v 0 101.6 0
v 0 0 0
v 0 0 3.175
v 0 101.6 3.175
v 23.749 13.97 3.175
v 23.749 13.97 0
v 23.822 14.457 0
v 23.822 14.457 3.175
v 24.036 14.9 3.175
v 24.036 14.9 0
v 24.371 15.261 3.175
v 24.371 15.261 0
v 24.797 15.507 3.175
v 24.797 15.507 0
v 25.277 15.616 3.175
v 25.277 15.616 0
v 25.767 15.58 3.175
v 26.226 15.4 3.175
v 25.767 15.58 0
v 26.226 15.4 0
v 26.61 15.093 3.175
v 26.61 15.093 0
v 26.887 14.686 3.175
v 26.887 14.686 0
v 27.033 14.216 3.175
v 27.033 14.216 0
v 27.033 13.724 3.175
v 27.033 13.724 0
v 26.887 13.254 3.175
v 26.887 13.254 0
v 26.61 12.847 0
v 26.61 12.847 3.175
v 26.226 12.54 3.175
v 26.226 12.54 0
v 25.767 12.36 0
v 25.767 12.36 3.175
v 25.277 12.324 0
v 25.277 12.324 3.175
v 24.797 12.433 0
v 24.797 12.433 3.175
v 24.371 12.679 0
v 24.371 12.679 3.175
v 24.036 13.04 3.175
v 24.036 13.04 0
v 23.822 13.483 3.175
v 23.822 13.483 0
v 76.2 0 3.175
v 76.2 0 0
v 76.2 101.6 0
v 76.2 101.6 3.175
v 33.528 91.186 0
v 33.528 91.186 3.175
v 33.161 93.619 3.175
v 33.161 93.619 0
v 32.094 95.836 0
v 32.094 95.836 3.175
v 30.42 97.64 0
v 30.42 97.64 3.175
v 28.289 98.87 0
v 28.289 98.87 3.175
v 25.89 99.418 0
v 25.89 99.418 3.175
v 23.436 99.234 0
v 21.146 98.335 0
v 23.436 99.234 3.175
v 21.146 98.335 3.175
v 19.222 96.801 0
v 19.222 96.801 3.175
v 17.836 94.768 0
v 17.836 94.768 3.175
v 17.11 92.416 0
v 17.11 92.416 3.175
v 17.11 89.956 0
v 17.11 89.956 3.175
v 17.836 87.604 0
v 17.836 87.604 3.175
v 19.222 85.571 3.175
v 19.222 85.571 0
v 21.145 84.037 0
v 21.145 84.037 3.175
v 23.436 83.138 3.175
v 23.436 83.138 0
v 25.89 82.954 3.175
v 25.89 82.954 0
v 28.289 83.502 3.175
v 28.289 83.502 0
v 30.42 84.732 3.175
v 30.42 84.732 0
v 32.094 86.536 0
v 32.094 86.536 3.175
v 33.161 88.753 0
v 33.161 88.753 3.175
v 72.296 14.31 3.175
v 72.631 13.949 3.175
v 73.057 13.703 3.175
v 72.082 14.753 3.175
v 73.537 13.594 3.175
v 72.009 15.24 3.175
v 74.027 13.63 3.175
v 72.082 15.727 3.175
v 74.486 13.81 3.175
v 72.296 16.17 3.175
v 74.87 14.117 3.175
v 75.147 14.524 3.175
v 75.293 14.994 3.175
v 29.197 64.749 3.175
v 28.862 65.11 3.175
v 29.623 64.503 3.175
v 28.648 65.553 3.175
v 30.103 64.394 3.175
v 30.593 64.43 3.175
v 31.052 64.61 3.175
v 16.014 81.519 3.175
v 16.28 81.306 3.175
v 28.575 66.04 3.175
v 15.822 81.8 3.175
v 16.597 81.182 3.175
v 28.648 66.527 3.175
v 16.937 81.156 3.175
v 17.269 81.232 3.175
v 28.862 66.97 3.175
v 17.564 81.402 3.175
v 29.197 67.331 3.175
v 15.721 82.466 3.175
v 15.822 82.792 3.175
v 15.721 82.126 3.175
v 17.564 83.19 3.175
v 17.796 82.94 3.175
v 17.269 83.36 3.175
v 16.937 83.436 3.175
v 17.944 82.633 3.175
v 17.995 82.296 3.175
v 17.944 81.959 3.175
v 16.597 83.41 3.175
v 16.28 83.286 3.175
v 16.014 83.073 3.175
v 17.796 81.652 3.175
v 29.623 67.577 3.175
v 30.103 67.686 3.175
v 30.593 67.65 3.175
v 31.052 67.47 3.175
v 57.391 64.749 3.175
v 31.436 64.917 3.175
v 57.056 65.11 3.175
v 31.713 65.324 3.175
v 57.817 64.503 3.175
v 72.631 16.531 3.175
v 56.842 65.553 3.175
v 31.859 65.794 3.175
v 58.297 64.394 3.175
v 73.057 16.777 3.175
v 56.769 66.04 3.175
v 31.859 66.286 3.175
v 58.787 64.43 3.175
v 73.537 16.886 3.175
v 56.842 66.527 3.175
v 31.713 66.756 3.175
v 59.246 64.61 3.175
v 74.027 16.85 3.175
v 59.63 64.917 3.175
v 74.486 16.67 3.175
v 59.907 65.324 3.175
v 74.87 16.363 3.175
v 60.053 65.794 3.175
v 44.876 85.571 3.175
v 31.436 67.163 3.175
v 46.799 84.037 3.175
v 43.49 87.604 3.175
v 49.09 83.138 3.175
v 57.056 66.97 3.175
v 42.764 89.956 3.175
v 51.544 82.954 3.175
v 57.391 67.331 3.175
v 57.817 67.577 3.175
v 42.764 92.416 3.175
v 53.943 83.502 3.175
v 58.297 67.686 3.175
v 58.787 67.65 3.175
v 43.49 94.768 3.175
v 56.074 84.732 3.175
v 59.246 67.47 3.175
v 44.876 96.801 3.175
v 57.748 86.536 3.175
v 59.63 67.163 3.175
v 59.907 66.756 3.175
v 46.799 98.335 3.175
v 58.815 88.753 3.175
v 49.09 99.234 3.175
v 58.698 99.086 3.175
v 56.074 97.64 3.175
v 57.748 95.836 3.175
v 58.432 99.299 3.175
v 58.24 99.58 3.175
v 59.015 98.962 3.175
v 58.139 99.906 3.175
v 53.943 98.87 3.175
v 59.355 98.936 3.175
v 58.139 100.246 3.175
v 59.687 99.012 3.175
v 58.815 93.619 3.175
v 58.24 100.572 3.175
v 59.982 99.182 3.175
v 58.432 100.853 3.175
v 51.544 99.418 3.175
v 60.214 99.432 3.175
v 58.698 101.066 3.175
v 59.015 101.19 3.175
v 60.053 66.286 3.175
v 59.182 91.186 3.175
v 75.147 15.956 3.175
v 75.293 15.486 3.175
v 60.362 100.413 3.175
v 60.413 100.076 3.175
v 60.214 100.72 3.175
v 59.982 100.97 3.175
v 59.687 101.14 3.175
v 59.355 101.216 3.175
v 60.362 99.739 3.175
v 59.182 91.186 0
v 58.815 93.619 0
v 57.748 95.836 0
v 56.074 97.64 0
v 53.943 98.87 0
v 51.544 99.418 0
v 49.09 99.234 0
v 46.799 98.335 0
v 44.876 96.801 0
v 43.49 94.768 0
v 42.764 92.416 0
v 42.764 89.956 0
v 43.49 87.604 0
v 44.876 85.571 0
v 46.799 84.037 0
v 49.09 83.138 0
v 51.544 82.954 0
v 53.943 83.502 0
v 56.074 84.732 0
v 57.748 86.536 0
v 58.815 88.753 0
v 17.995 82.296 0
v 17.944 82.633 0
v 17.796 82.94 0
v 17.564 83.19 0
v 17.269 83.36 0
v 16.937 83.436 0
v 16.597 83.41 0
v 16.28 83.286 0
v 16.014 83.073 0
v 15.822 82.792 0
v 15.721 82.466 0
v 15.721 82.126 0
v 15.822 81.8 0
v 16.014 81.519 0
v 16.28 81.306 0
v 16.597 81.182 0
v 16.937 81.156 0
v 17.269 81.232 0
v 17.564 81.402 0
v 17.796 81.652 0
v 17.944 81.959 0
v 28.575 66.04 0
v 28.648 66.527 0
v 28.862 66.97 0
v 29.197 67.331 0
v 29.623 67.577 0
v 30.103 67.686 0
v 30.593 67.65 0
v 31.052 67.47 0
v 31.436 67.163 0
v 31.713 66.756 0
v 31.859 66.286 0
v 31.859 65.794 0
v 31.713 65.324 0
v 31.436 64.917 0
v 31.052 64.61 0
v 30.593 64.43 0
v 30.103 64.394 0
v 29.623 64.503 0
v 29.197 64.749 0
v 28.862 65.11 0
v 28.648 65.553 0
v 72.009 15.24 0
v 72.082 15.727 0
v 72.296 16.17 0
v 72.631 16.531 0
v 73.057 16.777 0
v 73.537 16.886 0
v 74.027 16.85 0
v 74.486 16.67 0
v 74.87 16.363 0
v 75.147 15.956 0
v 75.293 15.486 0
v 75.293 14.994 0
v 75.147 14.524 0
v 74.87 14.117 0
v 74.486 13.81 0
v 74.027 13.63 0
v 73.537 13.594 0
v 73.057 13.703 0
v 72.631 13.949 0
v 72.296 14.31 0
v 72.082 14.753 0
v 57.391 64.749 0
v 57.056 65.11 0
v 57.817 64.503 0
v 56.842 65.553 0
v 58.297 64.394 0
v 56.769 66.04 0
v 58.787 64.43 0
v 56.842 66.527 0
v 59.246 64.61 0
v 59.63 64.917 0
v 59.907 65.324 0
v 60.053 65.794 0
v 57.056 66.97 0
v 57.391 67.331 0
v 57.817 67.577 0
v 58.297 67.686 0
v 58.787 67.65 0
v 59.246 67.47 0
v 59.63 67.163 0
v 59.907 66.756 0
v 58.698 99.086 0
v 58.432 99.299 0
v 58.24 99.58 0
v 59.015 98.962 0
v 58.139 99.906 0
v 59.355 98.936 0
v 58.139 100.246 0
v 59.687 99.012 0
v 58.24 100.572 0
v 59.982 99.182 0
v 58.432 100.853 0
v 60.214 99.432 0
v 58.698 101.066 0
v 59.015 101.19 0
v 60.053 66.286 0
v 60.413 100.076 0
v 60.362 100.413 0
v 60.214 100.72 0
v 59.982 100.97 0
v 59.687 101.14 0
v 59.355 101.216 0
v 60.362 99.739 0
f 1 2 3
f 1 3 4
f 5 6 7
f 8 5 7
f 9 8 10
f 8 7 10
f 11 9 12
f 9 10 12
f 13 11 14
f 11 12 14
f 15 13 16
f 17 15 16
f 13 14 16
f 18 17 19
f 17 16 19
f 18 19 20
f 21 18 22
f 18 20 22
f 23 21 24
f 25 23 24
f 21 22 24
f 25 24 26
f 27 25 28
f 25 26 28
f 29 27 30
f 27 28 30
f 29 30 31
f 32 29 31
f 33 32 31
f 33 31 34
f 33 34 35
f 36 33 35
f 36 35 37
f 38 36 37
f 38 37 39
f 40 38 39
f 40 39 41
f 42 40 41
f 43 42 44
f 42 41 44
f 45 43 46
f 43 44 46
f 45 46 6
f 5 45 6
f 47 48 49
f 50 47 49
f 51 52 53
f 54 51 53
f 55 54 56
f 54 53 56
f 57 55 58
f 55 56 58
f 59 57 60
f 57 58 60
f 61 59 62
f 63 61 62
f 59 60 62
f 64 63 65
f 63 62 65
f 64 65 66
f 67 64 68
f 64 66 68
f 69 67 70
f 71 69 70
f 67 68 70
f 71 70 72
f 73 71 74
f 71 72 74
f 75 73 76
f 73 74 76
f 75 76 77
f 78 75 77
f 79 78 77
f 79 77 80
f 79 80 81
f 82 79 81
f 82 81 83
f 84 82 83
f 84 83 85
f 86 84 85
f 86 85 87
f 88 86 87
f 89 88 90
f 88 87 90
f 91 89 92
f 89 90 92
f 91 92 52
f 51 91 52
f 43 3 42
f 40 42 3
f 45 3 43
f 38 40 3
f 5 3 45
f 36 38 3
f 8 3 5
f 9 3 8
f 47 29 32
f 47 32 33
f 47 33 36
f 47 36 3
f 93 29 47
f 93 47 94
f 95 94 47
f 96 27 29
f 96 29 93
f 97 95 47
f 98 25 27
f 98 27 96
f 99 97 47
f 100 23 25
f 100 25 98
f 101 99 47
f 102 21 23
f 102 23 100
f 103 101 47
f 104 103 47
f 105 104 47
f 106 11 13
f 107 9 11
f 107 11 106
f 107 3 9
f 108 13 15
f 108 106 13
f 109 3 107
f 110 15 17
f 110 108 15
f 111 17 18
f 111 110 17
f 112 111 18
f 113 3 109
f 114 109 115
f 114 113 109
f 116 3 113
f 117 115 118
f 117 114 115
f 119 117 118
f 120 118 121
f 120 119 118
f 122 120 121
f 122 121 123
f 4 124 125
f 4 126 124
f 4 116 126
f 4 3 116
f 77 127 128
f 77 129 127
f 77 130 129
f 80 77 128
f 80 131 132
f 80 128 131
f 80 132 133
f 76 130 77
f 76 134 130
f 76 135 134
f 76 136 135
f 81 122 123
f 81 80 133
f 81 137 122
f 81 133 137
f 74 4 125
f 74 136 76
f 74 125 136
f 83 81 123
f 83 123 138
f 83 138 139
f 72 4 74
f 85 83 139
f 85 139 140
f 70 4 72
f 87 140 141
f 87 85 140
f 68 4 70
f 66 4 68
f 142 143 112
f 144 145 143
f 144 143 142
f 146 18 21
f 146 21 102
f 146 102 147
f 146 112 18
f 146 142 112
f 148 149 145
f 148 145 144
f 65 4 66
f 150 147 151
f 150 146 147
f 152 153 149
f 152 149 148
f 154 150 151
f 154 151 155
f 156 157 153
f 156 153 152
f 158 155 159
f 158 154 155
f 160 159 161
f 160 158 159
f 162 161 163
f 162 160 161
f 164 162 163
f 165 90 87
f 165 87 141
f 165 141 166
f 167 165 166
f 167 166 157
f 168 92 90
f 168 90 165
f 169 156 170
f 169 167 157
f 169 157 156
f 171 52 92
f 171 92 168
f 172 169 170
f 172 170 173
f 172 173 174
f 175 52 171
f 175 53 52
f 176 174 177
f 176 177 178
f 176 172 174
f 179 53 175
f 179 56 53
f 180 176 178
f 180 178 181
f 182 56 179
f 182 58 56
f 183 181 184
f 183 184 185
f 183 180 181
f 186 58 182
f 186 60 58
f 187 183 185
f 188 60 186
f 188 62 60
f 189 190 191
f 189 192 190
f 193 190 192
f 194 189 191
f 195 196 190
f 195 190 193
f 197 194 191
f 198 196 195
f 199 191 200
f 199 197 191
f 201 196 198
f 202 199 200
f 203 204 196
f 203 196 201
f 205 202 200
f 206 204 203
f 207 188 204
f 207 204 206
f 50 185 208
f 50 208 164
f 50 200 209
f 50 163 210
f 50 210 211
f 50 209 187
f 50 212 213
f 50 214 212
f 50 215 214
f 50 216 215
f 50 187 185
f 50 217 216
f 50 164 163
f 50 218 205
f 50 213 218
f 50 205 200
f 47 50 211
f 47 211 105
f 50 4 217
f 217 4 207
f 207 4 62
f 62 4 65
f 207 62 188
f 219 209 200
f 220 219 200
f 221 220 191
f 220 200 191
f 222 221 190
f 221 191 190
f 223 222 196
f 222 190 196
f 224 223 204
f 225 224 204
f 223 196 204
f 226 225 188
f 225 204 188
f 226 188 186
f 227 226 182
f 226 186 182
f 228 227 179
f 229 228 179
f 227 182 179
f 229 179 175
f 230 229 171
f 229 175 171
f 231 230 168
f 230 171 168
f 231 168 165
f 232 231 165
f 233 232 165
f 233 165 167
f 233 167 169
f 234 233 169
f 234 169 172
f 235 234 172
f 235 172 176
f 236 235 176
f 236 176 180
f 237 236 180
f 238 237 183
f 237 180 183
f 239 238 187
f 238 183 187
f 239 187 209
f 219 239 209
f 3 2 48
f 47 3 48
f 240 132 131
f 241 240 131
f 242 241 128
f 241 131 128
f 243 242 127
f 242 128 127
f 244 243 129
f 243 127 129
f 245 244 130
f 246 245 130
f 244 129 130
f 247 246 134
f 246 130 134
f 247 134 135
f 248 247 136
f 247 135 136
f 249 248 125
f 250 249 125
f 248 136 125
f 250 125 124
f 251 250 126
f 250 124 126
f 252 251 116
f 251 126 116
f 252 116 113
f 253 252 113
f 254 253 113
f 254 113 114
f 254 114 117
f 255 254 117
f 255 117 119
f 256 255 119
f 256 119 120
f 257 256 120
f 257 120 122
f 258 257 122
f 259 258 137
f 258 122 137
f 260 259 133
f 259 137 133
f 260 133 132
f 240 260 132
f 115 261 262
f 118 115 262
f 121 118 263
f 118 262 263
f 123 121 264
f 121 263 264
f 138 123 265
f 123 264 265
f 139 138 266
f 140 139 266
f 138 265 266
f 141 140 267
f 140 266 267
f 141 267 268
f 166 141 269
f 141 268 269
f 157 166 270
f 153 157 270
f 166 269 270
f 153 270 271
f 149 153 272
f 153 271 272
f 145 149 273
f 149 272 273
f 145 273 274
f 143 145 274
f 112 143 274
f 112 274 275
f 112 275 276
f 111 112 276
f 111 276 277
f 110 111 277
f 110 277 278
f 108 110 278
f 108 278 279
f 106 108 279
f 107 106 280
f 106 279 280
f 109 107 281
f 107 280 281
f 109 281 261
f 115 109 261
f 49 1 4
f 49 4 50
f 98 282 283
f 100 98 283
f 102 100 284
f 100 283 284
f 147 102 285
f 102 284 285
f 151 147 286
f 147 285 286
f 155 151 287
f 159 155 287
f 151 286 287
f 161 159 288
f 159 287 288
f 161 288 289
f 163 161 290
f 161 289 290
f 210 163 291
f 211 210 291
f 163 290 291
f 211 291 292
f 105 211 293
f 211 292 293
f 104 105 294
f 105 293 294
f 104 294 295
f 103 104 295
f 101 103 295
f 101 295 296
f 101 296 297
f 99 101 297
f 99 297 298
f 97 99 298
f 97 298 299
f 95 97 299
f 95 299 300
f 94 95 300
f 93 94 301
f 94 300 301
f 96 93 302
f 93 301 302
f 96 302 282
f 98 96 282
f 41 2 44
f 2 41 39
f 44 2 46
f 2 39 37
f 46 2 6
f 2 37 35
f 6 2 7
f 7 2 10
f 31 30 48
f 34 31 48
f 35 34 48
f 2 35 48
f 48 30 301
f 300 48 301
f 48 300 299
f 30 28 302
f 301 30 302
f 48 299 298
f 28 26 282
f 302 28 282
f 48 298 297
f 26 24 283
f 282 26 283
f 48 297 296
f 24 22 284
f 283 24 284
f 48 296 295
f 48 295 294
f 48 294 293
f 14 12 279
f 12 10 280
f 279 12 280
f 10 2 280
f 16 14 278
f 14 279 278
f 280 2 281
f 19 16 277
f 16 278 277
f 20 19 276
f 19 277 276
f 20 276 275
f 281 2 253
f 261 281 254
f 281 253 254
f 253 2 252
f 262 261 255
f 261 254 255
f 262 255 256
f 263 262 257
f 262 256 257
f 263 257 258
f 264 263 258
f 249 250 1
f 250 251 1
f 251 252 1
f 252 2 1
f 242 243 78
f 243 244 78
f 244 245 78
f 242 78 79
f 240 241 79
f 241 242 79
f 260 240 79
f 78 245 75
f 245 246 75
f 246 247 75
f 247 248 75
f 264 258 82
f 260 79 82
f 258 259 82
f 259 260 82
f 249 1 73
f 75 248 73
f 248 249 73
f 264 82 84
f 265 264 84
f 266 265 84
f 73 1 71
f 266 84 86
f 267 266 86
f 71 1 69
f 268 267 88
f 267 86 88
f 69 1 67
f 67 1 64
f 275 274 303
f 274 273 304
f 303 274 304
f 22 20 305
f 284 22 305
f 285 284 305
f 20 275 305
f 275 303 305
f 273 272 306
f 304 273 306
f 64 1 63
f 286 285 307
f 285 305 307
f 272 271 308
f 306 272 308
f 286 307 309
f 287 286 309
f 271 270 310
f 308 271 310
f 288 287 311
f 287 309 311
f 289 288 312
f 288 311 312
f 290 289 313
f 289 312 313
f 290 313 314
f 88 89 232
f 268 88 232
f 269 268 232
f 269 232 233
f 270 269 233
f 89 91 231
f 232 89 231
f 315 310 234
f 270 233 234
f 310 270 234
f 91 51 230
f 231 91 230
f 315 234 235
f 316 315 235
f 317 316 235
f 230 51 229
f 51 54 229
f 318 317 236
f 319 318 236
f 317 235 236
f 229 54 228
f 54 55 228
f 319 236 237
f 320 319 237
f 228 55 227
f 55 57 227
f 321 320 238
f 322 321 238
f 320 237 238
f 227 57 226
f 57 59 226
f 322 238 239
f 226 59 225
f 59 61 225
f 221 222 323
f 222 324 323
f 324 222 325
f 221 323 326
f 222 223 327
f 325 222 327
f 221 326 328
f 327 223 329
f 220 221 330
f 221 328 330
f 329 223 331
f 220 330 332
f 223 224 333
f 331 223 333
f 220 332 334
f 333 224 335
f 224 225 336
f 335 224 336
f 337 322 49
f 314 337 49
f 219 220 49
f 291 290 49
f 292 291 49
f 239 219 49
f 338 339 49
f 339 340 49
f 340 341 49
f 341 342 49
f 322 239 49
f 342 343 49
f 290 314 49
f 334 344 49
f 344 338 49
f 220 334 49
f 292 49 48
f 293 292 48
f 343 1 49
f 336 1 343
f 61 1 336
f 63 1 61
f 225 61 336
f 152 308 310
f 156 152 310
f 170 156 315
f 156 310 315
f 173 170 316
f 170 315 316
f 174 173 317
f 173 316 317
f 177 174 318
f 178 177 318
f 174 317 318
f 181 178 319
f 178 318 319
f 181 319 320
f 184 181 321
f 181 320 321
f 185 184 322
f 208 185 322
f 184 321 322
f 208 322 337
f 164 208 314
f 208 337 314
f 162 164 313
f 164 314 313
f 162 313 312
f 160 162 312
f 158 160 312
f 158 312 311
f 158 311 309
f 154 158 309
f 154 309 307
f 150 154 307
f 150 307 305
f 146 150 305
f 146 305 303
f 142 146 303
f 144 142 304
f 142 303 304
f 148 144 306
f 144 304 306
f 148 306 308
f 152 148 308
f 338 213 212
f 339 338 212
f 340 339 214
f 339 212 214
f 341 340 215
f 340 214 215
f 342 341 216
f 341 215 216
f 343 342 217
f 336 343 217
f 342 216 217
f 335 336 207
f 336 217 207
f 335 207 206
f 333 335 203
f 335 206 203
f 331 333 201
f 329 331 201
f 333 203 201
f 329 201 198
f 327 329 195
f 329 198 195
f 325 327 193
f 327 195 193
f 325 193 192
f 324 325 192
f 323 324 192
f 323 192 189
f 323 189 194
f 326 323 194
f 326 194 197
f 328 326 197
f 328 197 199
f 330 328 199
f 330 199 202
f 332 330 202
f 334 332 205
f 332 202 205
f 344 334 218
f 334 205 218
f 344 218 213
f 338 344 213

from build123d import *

# Parameters (mm, degrees)
SKETCH2_W           = 76.2
SKETCH2_H           = 101.6
BOSS_EXTRUDE1_DEPTH = 3.175
SKETCH3_R           = 8.255
SKETCH3_R_2         = 1.143
CUT_EXTRUDE1_DEPTH  = 3.175
SKETCH6_R           = 1.651
CUT_EXTRUDE2_DEPTH  = 3.175


with BuildPart() as part:
    # Sketch2 → Boss-Extrude1 (new body)
    with BuildSketch(Plane.XY):
        with Locations((38.1, 50.8)):
            Rectangle(SKETCH2_W, SKETCH2_H)
    extrude(amount=BOSS_EXTRUDE1_DEPTH)

    # Sketch3 → Cut-Extrude1 (cut)
    with BuildSketch(Plane.XY.offset(3.175)):
        with Locations((25.273, 91.186)):
            Circle(SKETCH3_R)
        with Locations((50.927, 91.186)):
            Circle(SKETCH3_R)
        with Locations((59.269530294, 100.076)):
            Circle(SKETCH3_R_2)
        with Locations((16.851530294, 82.296)):
            Circle(SKETCH3_R_2)
    extrude(amount=-CUT_EXTRUDE1_DEPTH, mode=Mode.SUBTRACT)

    # Sketch6 → Cut-Extrude2 (cut)
    with BuildSketch(Plane(origin=(0, 0, 0), x_dir=(-1, 0, 0), z_dir=(0, 0, -1))):
        with Locations((-73.66, 15.24)):
            Circle(SKETCH6_R)
        with Locations((-25.4, 13.97)):
            Circle(SKETCH6_R)
        with Locations((-30.226, 66.04)):
            Circle(SKETCH6_R)
        with Locations((-58.42, 66.04)):
            Circle(SKETCH6_R)
    extrude(amount=-CUT_EXTRUDE2_DEPTH, mode=Mode.SUBTRACT)


solid = part.part
